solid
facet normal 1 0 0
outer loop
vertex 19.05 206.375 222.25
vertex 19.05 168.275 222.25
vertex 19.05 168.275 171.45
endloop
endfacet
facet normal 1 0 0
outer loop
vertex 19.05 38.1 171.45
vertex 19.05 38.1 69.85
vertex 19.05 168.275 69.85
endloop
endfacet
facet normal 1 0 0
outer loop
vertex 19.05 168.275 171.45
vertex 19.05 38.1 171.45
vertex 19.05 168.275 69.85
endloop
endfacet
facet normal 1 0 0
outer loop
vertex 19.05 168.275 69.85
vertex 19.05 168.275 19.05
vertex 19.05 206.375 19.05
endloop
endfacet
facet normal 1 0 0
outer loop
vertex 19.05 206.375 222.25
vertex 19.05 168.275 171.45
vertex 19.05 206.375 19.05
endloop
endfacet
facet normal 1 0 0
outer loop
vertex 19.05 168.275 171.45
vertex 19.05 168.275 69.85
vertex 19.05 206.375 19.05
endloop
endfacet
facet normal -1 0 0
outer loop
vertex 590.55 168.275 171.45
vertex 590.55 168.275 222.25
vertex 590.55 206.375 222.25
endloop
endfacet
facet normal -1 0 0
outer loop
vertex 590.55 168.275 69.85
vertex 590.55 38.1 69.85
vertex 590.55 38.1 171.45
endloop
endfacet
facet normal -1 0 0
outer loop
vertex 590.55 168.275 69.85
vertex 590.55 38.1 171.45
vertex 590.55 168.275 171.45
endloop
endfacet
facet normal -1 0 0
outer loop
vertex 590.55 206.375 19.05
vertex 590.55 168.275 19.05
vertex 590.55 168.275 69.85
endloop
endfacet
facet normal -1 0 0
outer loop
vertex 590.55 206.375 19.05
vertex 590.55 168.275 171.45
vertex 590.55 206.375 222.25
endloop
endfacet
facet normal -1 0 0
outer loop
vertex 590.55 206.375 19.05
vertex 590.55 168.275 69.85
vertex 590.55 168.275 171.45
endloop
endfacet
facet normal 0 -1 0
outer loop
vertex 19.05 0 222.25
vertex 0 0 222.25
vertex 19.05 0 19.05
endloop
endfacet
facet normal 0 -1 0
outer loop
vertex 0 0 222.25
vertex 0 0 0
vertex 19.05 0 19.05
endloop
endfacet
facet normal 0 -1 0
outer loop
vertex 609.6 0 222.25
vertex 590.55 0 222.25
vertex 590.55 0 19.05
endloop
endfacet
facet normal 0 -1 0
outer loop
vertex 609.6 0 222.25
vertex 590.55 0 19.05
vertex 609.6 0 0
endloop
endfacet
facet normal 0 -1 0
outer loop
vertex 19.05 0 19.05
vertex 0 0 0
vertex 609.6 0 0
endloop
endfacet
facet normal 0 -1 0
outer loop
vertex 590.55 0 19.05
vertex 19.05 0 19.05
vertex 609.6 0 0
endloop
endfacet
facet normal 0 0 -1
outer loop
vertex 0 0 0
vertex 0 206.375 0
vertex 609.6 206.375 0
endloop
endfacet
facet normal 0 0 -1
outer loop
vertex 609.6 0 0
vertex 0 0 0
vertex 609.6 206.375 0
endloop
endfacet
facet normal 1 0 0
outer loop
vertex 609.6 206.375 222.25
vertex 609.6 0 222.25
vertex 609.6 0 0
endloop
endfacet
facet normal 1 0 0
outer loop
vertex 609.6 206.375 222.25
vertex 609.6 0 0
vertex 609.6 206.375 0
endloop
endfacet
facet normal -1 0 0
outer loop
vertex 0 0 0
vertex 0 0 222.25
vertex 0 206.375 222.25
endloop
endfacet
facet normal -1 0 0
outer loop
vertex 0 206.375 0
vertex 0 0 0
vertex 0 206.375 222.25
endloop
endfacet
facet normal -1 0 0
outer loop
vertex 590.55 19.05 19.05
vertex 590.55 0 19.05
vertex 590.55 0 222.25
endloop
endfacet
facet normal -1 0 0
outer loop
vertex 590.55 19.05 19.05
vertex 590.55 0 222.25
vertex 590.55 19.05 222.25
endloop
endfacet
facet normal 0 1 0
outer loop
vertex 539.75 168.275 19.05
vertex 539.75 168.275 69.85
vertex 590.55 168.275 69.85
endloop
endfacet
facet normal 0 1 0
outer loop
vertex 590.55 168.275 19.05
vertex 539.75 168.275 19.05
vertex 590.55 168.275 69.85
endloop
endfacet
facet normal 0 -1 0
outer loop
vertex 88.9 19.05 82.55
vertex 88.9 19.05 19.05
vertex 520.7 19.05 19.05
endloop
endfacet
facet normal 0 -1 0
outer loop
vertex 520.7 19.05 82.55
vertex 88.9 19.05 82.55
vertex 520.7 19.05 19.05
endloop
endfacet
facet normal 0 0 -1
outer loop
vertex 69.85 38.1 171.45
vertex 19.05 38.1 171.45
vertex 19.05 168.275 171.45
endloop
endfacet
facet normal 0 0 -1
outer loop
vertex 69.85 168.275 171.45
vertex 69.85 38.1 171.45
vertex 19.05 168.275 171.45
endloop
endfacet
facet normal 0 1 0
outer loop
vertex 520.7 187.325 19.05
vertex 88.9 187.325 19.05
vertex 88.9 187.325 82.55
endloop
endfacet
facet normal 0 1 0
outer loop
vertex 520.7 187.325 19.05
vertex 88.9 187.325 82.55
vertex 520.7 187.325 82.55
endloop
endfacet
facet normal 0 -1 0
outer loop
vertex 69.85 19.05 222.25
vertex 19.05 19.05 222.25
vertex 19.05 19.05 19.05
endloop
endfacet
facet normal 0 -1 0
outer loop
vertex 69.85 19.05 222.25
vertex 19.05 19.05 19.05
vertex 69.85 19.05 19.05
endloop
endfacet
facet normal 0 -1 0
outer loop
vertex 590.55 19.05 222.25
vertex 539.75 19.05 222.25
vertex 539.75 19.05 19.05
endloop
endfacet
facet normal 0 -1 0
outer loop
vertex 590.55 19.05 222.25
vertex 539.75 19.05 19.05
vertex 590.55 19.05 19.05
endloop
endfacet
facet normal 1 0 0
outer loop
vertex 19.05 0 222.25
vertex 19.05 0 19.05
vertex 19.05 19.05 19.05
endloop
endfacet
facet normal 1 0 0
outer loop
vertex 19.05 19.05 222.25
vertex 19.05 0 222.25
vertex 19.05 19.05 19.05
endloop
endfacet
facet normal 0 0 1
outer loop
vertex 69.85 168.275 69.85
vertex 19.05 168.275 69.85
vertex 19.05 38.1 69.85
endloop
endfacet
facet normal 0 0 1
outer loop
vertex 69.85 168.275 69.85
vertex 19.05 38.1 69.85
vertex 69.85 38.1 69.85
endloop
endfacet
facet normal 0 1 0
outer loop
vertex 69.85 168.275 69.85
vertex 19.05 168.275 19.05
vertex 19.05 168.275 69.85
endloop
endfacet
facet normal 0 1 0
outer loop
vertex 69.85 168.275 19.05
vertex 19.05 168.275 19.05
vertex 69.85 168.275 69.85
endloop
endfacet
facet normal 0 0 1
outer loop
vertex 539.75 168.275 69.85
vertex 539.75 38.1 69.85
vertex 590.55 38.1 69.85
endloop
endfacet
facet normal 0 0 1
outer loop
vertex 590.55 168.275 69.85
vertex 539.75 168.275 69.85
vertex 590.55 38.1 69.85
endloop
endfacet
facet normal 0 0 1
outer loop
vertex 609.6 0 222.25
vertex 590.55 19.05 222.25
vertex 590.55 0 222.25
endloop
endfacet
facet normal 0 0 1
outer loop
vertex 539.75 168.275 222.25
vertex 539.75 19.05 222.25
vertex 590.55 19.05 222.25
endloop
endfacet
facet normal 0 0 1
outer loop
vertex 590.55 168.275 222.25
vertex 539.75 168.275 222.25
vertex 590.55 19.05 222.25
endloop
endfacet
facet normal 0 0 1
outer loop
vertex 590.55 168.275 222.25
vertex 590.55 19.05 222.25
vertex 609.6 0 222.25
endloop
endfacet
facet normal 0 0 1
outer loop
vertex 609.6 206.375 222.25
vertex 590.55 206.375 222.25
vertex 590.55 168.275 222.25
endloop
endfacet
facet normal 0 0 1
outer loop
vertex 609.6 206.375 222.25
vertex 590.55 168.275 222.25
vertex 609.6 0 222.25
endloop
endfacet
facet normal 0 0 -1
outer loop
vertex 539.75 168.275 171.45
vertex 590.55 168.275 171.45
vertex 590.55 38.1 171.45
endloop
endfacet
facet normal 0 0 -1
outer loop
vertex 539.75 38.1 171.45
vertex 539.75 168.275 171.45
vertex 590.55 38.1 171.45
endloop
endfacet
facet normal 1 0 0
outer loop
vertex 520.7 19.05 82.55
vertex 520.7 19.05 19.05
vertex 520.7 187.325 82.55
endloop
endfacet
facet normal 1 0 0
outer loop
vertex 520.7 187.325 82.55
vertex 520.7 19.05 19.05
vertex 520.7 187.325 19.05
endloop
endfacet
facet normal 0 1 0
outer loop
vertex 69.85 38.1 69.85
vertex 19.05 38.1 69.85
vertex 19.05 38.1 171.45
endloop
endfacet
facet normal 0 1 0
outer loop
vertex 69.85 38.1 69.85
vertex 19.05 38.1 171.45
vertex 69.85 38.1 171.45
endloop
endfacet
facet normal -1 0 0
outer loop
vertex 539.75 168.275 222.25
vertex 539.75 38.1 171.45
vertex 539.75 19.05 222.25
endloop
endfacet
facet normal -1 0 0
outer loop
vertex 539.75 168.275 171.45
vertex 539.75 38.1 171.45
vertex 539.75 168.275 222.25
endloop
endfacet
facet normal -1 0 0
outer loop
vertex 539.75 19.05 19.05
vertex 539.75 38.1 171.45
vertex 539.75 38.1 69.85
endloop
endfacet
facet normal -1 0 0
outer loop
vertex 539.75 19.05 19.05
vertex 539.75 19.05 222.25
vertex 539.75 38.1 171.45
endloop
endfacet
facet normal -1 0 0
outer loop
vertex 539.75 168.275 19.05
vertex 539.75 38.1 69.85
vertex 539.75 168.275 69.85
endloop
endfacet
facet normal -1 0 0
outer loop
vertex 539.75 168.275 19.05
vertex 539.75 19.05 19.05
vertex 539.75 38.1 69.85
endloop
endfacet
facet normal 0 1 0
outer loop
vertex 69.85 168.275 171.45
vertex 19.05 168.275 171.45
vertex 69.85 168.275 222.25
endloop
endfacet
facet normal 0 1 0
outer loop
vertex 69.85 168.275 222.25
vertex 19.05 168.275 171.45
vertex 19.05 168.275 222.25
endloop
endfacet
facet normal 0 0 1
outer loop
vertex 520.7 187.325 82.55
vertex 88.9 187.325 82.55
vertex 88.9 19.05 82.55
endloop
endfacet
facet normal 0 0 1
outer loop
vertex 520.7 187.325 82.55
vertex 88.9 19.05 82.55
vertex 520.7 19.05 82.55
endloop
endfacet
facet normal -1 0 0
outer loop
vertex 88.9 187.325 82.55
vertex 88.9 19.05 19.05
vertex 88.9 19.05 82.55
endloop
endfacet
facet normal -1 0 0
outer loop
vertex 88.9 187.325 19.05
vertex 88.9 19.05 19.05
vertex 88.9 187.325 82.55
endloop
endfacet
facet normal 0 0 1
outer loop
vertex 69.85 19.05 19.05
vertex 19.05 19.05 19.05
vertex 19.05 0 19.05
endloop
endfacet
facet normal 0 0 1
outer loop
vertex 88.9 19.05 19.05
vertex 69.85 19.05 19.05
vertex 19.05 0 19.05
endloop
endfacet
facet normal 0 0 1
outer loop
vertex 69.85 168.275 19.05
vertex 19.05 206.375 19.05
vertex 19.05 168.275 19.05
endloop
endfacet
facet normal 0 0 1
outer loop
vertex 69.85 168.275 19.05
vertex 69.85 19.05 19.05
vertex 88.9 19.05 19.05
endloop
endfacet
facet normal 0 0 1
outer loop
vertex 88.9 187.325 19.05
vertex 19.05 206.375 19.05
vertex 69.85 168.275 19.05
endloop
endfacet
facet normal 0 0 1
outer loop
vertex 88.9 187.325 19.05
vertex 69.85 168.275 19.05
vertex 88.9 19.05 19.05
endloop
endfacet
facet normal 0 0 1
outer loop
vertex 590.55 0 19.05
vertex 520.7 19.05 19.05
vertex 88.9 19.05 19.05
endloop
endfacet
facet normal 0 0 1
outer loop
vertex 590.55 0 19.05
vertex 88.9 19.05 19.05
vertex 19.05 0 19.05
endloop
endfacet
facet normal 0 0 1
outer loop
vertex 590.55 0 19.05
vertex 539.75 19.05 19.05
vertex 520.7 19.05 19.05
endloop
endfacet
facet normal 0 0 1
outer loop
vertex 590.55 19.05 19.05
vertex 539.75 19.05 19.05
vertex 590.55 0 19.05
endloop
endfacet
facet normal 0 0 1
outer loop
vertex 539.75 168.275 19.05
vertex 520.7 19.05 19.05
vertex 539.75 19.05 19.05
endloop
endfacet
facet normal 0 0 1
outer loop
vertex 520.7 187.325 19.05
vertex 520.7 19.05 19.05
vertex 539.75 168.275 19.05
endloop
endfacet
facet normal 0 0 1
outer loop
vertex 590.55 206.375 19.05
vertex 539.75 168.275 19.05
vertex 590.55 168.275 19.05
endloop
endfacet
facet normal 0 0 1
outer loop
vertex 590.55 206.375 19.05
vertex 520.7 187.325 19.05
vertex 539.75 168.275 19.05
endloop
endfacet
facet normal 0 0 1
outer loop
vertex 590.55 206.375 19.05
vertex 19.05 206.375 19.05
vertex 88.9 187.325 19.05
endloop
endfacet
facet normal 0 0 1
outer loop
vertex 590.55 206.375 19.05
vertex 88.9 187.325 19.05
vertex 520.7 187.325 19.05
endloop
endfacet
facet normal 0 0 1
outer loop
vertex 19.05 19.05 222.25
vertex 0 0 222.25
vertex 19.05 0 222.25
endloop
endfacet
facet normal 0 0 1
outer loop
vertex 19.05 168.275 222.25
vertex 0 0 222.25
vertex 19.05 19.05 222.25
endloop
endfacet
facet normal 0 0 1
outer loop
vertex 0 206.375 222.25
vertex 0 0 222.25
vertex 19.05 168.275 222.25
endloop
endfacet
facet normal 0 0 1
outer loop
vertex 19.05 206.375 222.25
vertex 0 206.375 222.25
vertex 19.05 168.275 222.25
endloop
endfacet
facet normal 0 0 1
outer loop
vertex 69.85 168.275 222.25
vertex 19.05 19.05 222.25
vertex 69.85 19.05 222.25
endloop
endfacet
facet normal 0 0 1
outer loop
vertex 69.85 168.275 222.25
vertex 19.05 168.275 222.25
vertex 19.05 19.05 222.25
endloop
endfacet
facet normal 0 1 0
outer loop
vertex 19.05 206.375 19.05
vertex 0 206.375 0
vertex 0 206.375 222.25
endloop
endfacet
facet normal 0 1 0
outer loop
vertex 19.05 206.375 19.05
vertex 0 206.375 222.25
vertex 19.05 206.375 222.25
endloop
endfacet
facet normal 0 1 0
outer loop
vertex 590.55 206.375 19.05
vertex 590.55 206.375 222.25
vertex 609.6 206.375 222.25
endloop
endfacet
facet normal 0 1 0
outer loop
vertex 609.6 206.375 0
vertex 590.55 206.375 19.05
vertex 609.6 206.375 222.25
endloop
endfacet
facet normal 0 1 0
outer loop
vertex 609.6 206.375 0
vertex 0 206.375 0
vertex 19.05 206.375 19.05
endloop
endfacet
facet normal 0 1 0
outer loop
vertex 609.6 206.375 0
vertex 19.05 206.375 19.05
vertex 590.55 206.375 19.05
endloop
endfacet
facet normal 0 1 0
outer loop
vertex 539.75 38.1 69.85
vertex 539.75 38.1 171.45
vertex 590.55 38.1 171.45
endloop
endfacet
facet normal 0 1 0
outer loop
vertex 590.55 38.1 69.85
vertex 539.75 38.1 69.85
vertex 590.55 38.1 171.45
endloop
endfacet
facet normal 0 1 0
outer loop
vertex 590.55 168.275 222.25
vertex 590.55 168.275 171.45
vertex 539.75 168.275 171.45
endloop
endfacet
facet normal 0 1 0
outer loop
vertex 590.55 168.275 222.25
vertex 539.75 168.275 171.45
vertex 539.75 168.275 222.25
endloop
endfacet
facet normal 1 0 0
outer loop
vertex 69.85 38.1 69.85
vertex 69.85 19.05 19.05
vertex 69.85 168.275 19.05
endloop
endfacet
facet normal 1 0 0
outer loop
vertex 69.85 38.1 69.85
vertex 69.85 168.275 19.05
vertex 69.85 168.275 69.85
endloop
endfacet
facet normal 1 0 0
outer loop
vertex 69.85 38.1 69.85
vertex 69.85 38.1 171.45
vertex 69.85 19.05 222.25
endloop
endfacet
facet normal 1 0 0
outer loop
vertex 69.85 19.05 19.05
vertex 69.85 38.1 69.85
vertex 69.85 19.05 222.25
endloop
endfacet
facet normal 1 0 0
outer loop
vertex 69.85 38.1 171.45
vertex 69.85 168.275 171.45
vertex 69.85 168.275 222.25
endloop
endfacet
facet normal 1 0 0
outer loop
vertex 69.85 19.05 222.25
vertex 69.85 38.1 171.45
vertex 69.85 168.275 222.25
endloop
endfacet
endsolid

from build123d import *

# Parameters (mm, degrees)
F0_W      = 609.6
F0_H      = 206.375
F1_DEPTH  = 19.05
F2_W      = 431.8
F2_H      = 168.275
F3_DEPTH  = 63.5
F4_W      = 19.05
F4_H      = 206.375
F5_DEPTH  = 203.2
F6_W      = 50.8
F6_H      = 130.175
F7_DEPTH  = 50.8
F8_W      = 130.175
F8_H      = 50.8
F9_DEPTH  = 50.8
F10_W     = 130.175
F10_H     = 50.8
F11_DEPTH = 50.8
F12_W     = 50.8
F12_H     = 203.2
F13_DEPTH = 19.05


with BuildPart() as f1:
    # F0 (on Top) → F1 (new body)
    with BuildSketch(Plane.XY):
        with Locations((304.8, 103.1875)):
            Rectangle(F0_W, F0_H)
    extrude(amount=F1_DEPTH)

    # F2 (on face) → F3 (join)
    with BuildSketch(Plane.XY.offset(19.05)):
        with Locations((304.8, 103.1875)):
            Rectangle(F2_W, F2_H)
    extrude(amount=F3_DEPTH)

    # F4 (on face) → F5 (join)
    with BuildSketch(Plane.XY.offset(19.05)):
        with Locations((9.525, 103.1875)):
            Rectangle(F4_W, F4_H)
        with Locations((600.075, 103.1875)):
            Rectangle(F4_W, F4_H)
    extrude(amount=F5_DEPTH)

    # F6 (on face) → F7 (join)
    with BuildSketch(Plane.XY.offset(19.05)):
        with Locations((44.45, 103.1875)):
            Rectangle(F6_W, F6_H)
        with Locations((565.15, 103.1875)):
            Rectangle(F6_W, F6_H)
    extrude(amount=F7_DEPTH)

    # F8 (on face) → F9 (join)
    with BuildSketch(Plane.YZ.offset(19.05)):
        with Locations((103.1875, 196.85)):
            Rectangle(F8_W, F8_H)
    extrude(amount=F9_DEPTH)

    # F10 (on face) → F11 (join)
    with BuildSketch(Plane(origin=(590.55, 0, 0), x_dir=(0, -1, 0), z_dir=(-1, 0, 0))):
        with Locations((-103.1875, 196.85)):
            Rectangle(F10_W, F10_H)
    extrude(amount=F11_DEPTH)

    # F12 (on face) → F13 (join)
    with BuildSketch(Plane.XZ.offset(-38.1)):
        with Locations((44.45, 120.65)):
            Rectangle(F12_W, F12_H)
        with Locations((565.15, 120.65)):
            Rectangle(F12_W, F12_H)
    extrude(amount=F13_DEPTH)


solid = f1.part
